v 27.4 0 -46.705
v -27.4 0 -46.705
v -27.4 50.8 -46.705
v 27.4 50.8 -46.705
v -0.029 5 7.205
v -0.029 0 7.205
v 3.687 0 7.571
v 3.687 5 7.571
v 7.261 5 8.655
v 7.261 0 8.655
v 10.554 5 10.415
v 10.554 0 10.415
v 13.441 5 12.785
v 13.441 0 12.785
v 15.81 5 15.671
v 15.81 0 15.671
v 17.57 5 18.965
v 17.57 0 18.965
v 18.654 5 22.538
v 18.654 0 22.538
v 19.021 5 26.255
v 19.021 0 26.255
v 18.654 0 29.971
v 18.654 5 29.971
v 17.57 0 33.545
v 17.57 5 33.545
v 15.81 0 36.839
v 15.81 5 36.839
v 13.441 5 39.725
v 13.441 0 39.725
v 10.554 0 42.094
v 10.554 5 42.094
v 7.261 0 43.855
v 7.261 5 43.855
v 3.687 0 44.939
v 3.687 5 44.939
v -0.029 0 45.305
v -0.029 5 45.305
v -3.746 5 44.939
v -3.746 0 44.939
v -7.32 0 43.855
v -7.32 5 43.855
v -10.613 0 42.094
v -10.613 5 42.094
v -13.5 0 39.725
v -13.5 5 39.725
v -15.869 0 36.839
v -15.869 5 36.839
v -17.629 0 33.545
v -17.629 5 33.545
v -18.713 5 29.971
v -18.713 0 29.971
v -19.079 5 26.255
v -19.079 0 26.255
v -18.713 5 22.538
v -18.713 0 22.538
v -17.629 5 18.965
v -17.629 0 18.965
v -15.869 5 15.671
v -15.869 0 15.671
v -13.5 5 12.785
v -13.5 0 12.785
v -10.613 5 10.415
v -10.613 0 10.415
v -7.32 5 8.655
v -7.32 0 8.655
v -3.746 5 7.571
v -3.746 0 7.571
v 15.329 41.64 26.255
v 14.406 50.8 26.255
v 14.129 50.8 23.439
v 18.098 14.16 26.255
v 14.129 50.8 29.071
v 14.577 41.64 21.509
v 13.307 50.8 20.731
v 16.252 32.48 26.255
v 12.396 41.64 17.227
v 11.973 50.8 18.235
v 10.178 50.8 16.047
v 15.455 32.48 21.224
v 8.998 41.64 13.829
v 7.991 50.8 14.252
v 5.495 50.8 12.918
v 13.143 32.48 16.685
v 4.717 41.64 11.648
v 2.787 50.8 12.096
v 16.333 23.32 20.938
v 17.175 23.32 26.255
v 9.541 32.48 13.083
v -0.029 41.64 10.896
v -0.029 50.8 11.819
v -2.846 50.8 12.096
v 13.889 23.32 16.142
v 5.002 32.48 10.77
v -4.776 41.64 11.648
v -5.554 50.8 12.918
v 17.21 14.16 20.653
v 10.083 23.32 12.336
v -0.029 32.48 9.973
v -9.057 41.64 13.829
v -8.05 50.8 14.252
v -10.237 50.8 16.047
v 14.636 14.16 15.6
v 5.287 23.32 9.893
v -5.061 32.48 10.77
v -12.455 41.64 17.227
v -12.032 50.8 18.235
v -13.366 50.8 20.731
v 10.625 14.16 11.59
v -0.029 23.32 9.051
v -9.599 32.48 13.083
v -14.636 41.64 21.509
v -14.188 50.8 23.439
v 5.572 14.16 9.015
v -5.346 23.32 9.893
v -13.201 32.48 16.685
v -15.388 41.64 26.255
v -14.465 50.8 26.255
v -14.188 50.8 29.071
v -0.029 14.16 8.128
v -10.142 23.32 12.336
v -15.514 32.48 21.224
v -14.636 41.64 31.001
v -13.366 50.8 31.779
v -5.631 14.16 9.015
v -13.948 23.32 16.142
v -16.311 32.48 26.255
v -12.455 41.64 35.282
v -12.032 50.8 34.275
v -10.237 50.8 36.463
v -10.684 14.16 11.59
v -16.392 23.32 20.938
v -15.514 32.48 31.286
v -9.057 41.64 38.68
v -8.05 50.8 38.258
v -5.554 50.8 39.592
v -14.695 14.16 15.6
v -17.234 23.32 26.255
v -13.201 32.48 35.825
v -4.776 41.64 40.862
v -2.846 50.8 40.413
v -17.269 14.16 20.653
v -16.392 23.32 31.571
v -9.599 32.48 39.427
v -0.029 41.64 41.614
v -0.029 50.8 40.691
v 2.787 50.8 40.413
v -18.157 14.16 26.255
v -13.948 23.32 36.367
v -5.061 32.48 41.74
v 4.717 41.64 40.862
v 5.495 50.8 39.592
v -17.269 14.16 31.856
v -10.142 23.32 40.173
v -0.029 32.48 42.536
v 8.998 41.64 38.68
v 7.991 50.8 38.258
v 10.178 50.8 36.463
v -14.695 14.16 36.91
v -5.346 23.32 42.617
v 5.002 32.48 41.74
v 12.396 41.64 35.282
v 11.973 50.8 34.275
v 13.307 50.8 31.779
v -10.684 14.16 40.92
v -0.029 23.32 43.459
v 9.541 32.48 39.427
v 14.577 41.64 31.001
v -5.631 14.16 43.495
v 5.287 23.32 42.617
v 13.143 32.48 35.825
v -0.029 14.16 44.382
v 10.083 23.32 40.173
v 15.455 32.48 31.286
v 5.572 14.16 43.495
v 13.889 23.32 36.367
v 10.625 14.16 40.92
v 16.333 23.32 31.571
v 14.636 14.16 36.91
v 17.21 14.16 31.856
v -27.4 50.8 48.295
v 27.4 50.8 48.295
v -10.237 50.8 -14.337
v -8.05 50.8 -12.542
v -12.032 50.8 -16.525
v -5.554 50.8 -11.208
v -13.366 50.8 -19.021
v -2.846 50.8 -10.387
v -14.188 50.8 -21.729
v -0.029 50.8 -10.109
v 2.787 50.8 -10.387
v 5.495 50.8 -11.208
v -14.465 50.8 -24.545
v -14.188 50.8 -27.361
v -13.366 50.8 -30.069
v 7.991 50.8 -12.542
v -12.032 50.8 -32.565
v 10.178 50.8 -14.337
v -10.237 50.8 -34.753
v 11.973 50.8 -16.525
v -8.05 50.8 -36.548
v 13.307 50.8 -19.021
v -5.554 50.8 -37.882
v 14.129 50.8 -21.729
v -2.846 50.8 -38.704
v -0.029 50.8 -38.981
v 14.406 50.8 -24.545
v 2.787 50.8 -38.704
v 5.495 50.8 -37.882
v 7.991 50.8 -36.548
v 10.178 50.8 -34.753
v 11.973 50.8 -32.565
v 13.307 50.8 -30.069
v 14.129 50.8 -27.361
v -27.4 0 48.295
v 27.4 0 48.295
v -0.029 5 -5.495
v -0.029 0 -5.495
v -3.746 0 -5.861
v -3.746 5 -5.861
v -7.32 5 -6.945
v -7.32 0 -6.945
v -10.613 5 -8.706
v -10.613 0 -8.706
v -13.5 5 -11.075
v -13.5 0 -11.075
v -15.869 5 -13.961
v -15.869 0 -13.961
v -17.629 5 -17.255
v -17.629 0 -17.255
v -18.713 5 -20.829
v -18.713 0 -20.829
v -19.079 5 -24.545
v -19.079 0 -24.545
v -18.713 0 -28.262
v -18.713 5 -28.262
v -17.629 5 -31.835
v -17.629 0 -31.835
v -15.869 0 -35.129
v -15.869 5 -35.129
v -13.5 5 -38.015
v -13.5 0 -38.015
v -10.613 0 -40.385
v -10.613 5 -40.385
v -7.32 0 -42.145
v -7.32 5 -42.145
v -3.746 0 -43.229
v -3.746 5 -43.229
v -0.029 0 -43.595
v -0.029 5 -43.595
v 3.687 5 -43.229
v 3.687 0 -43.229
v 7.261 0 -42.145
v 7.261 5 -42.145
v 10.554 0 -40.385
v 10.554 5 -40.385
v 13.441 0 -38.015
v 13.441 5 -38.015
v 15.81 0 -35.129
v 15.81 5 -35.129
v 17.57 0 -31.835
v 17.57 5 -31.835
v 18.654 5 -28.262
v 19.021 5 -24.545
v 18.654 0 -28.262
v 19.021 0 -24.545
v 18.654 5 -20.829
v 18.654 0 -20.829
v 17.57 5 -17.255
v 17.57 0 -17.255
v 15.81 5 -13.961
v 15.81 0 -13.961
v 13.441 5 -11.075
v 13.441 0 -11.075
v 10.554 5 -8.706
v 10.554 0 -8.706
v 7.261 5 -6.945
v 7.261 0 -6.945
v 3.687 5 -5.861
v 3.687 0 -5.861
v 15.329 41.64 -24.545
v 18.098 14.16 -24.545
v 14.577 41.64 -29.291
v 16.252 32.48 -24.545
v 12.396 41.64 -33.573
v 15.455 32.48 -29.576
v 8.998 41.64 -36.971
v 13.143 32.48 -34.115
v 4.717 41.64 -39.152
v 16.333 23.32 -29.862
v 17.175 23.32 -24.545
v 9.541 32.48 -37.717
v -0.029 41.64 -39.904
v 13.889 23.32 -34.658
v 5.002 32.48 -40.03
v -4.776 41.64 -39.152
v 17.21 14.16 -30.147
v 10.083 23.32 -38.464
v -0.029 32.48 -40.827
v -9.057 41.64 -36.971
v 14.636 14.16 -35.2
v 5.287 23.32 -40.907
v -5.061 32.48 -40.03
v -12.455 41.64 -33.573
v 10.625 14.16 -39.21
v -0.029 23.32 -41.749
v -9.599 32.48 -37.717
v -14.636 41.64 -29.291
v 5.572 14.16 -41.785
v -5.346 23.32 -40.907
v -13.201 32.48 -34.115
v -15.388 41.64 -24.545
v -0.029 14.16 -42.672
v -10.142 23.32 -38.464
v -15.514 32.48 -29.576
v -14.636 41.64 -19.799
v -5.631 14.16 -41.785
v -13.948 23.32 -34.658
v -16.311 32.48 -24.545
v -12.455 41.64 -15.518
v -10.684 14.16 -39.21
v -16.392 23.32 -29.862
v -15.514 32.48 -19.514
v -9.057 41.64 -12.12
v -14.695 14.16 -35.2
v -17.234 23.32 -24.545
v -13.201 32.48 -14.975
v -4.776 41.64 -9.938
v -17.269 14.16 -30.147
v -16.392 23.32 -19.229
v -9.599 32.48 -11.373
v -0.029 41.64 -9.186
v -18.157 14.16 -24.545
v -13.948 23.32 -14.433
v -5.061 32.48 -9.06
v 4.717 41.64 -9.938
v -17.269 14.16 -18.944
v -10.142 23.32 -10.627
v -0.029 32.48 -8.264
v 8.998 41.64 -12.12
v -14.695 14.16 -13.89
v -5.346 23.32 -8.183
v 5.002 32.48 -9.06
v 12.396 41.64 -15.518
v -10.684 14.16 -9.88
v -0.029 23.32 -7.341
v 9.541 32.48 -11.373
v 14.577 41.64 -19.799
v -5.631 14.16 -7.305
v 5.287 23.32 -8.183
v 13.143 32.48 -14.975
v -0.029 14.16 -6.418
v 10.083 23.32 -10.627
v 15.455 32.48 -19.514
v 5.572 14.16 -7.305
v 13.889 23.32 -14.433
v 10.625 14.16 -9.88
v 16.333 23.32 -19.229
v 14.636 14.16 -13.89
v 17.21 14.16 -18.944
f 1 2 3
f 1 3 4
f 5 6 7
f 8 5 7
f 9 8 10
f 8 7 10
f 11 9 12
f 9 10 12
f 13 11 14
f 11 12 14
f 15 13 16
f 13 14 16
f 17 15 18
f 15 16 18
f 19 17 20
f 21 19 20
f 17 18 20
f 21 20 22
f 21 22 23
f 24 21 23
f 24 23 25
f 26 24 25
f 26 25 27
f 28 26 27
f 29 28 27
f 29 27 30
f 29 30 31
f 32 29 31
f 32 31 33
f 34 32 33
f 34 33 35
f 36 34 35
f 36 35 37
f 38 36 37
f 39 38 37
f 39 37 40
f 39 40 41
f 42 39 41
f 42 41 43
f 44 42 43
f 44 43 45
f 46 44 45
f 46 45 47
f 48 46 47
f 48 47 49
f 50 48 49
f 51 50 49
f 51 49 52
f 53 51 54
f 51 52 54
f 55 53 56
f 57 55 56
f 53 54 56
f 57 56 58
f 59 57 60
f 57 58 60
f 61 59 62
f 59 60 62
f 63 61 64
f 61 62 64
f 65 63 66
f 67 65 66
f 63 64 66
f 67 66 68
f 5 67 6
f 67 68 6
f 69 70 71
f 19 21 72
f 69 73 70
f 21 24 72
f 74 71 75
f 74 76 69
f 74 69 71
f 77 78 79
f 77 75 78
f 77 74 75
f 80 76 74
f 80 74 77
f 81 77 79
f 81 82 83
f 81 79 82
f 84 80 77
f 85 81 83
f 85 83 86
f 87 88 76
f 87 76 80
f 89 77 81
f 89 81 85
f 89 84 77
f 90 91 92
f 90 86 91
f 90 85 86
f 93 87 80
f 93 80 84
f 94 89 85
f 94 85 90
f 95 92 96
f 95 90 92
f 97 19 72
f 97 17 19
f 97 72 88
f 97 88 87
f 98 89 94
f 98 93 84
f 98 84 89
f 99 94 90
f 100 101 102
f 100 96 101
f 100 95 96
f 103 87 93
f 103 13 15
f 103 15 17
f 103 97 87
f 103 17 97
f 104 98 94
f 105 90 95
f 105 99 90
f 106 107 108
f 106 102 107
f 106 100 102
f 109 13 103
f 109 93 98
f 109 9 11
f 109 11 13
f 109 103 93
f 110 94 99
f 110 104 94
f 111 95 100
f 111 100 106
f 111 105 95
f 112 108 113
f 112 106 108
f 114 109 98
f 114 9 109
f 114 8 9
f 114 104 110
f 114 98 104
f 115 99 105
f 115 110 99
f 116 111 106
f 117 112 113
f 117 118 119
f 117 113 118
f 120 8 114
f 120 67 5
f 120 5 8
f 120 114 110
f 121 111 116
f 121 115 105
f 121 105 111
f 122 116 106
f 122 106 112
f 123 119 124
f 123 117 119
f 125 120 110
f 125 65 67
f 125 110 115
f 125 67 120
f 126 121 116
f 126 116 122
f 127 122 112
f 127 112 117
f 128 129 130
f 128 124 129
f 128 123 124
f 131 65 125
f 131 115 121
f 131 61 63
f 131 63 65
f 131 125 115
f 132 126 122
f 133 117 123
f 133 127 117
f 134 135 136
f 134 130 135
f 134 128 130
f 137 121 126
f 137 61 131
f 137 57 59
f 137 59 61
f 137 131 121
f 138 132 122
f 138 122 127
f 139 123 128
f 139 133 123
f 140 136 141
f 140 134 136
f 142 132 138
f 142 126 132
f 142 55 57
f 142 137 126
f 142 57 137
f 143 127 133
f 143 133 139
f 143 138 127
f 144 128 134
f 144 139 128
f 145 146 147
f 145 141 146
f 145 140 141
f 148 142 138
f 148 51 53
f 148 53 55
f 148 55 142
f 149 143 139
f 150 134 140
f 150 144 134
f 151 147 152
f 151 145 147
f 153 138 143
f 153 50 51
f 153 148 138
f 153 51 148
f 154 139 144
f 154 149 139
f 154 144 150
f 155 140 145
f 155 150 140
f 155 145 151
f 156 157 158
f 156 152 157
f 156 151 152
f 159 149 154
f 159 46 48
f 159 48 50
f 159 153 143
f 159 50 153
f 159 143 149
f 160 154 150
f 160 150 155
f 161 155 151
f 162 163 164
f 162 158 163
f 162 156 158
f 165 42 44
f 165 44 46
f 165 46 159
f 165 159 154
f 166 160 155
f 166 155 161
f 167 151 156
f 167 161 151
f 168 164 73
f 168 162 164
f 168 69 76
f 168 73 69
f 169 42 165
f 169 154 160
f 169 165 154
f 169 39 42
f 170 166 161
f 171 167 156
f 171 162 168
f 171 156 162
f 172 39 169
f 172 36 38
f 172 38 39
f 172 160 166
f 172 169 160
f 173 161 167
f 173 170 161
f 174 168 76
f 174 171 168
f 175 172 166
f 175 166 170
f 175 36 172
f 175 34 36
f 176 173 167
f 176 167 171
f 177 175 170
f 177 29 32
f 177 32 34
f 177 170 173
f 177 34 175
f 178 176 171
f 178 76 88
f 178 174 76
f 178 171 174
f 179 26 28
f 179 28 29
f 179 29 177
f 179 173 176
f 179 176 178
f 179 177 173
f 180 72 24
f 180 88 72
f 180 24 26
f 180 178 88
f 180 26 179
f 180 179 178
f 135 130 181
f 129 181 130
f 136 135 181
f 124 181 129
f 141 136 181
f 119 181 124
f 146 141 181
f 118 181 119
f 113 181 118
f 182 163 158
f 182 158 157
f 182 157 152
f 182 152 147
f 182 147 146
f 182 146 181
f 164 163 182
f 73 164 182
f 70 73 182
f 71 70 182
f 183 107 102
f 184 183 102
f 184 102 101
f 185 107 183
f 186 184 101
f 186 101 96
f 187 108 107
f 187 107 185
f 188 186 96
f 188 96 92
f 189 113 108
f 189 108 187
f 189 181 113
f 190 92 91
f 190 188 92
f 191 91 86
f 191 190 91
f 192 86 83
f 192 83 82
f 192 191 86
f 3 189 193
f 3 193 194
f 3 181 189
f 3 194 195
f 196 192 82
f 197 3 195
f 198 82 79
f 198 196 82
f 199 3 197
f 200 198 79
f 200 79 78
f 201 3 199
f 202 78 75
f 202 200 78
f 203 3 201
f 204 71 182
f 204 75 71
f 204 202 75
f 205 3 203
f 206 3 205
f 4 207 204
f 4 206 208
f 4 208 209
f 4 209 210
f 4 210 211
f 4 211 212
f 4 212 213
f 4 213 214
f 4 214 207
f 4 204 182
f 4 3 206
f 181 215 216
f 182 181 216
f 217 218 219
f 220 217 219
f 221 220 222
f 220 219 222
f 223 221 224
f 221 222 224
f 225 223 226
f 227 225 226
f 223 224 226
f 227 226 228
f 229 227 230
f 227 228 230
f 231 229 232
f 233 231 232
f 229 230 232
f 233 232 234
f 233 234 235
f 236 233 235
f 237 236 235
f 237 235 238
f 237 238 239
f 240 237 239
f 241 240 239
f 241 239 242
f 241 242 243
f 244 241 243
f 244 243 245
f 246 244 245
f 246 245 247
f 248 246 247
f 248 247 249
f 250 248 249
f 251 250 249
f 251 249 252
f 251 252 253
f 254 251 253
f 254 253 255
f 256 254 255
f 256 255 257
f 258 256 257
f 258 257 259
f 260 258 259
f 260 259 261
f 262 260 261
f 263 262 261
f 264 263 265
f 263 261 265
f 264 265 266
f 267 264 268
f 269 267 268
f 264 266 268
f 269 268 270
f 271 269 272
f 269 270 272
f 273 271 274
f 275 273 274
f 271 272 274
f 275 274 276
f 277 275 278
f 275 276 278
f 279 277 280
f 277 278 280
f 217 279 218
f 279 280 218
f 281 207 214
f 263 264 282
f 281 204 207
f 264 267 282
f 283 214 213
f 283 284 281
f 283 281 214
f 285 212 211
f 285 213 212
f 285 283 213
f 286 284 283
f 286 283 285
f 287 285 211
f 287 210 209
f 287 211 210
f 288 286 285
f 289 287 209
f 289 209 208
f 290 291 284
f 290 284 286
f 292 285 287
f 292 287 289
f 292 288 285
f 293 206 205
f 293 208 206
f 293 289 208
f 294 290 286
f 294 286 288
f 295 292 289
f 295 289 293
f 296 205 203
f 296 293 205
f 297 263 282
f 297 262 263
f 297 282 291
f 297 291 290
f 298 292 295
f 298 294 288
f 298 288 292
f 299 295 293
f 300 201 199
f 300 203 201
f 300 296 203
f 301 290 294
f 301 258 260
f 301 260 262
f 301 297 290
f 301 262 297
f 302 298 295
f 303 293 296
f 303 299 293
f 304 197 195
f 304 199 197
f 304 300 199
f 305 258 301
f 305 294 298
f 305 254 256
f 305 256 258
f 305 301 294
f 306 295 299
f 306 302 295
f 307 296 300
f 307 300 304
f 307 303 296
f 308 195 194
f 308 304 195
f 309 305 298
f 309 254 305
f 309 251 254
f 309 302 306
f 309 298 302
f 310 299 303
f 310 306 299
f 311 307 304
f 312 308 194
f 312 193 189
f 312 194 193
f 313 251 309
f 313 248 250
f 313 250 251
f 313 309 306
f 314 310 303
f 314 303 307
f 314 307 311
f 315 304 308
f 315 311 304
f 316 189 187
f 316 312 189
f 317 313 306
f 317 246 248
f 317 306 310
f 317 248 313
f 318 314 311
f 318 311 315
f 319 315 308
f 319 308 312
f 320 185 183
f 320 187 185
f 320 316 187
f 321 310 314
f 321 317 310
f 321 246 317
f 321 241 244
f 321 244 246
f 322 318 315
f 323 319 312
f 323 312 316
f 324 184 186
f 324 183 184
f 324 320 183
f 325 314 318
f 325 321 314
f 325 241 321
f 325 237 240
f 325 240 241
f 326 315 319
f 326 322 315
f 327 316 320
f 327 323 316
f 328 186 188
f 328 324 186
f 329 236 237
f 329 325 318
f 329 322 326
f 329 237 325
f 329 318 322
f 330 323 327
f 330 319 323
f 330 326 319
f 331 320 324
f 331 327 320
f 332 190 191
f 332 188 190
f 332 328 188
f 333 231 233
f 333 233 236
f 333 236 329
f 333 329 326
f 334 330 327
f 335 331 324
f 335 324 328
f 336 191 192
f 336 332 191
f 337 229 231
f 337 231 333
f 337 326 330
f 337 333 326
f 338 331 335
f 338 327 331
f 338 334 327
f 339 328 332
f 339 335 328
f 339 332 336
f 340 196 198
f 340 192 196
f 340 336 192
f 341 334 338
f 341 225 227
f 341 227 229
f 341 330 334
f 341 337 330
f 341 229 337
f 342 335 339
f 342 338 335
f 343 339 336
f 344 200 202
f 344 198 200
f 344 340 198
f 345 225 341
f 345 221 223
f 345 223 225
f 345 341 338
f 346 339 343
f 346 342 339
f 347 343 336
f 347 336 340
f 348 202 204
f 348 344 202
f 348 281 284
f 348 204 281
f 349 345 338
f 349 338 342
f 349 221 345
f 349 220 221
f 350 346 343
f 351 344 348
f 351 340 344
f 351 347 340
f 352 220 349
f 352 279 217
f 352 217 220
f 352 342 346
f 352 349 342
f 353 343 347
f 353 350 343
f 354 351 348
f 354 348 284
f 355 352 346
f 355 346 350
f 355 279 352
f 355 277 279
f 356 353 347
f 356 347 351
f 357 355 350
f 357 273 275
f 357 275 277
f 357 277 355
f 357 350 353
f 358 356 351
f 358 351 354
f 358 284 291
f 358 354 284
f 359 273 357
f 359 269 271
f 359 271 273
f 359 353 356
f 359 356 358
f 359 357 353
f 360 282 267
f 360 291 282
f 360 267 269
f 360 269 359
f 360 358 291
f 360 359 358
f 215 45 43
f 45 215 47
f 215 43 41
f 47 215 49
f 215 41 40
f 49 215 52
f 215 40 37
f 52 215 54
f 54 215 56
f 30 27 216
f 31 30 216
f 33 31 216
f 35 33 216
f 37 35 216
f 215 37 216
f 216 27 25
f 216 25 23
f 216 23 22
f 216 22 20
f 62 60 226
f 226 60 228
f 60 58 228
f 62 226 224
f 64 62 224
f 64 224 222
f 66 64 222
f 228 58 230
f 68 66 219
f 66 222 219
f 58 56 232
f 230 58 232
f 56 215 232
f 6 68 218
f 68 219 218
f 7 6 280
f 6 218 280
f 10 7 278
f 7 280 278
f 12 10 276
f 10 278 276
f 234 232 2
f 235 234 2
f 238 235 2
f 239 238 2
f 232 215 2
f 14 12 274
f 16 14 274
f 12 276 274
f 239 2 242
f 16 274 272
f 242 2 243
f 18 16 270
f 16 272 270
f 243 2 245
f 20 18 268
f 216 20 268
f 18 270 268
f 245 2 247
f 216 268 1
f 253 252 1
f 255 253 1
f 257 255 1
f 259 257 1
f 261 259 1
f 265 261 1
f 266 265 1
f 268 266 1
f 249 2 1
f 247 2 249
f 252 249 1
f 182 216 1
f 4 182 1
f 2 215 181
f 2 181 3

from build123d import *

# Parameters (mm, degrees)
SKETCH2_W           = 54.8
SKETCH2_H           = 95
BOSS_EXTRUDE1_DEPTH = 50.8
SKETCH3_R           = 19.05
CUT_EXTRUDE1_DEPTH  = 5
SKETCH4_R           = 14.435817204
SKETCH4_166_R       = 14.435817204


with BuildPart() as part:
    # Sketch2 → Boss-Extrude1 (new body)
    with BuildSketch(Plane(origin=(0, 0, 0), x_dir=(1, 0, 0), z_dir=(0, 1, 0))):
        with Locations((0, -0.795454545)):
            Rectangle(SKETCH2_W, SKETCH2_H)
    extrude(amount=BOSS_EXTRUDE1_DEPTH)

    # Sketch3 → Cut-Extrude1 (cut)
    with BuildSketch(Plane.XZ):
        with Locations(Location((-0.029477, 26.254895545, 0), (0, 0, 270))):
            Circle(SKETCH3_R)
        with Locations(Location((-0.029477, -24.545104455, 0), (0, 0, 90))):
            Circle(SKETCH3_R)
    extrude(amount=-CUT_EXTRUDE1_DEPTH, mode=Mode.SUBTRACT)

    # Sketch4 → section 0 of cut_loft1
    with BuildSketch(Plane(origin=(0, 50.8, 0), x_dir=(1, 0, 0), z_dir=(0, 1, 0)), mode=Mode.PRIVATE) as cut_loft1_s0:
        with Locations((-0.029477, 24.545104455)):
            Circle(SKETCH4_R)
    # loft up to a face of the part (cut_loft1)
    loft([cut_loft1_s0.sketch, Face(Wire([part.edges().sort_by_distance((-13.916329352, 5, -37.585726822))[0]]))], mode=Mode.SUBTRACT)

    # Sketch4<166> → section 0 of cut_loft2
    with BuildSketch(Plane(origin=(0, 50.8, 0), x_dir=(1, 0, 0), z_dir=(0, 1, 0)), mode=Mode.PRIVATE) as cut_loft2_s0:
        with Locations((-0.029477, -26.254895545)):
            Circle(SKETCH4_166_R)
    # loft up to a face of the part (cut_loft2)
    loft([cut_loft2_s0.sketch, Face(Wire([part.edges().sort_by_distance((13.857375352, 5, 39.295517913))[0]]))], mode=Mode.SUBTRACT)


solid = part.part
